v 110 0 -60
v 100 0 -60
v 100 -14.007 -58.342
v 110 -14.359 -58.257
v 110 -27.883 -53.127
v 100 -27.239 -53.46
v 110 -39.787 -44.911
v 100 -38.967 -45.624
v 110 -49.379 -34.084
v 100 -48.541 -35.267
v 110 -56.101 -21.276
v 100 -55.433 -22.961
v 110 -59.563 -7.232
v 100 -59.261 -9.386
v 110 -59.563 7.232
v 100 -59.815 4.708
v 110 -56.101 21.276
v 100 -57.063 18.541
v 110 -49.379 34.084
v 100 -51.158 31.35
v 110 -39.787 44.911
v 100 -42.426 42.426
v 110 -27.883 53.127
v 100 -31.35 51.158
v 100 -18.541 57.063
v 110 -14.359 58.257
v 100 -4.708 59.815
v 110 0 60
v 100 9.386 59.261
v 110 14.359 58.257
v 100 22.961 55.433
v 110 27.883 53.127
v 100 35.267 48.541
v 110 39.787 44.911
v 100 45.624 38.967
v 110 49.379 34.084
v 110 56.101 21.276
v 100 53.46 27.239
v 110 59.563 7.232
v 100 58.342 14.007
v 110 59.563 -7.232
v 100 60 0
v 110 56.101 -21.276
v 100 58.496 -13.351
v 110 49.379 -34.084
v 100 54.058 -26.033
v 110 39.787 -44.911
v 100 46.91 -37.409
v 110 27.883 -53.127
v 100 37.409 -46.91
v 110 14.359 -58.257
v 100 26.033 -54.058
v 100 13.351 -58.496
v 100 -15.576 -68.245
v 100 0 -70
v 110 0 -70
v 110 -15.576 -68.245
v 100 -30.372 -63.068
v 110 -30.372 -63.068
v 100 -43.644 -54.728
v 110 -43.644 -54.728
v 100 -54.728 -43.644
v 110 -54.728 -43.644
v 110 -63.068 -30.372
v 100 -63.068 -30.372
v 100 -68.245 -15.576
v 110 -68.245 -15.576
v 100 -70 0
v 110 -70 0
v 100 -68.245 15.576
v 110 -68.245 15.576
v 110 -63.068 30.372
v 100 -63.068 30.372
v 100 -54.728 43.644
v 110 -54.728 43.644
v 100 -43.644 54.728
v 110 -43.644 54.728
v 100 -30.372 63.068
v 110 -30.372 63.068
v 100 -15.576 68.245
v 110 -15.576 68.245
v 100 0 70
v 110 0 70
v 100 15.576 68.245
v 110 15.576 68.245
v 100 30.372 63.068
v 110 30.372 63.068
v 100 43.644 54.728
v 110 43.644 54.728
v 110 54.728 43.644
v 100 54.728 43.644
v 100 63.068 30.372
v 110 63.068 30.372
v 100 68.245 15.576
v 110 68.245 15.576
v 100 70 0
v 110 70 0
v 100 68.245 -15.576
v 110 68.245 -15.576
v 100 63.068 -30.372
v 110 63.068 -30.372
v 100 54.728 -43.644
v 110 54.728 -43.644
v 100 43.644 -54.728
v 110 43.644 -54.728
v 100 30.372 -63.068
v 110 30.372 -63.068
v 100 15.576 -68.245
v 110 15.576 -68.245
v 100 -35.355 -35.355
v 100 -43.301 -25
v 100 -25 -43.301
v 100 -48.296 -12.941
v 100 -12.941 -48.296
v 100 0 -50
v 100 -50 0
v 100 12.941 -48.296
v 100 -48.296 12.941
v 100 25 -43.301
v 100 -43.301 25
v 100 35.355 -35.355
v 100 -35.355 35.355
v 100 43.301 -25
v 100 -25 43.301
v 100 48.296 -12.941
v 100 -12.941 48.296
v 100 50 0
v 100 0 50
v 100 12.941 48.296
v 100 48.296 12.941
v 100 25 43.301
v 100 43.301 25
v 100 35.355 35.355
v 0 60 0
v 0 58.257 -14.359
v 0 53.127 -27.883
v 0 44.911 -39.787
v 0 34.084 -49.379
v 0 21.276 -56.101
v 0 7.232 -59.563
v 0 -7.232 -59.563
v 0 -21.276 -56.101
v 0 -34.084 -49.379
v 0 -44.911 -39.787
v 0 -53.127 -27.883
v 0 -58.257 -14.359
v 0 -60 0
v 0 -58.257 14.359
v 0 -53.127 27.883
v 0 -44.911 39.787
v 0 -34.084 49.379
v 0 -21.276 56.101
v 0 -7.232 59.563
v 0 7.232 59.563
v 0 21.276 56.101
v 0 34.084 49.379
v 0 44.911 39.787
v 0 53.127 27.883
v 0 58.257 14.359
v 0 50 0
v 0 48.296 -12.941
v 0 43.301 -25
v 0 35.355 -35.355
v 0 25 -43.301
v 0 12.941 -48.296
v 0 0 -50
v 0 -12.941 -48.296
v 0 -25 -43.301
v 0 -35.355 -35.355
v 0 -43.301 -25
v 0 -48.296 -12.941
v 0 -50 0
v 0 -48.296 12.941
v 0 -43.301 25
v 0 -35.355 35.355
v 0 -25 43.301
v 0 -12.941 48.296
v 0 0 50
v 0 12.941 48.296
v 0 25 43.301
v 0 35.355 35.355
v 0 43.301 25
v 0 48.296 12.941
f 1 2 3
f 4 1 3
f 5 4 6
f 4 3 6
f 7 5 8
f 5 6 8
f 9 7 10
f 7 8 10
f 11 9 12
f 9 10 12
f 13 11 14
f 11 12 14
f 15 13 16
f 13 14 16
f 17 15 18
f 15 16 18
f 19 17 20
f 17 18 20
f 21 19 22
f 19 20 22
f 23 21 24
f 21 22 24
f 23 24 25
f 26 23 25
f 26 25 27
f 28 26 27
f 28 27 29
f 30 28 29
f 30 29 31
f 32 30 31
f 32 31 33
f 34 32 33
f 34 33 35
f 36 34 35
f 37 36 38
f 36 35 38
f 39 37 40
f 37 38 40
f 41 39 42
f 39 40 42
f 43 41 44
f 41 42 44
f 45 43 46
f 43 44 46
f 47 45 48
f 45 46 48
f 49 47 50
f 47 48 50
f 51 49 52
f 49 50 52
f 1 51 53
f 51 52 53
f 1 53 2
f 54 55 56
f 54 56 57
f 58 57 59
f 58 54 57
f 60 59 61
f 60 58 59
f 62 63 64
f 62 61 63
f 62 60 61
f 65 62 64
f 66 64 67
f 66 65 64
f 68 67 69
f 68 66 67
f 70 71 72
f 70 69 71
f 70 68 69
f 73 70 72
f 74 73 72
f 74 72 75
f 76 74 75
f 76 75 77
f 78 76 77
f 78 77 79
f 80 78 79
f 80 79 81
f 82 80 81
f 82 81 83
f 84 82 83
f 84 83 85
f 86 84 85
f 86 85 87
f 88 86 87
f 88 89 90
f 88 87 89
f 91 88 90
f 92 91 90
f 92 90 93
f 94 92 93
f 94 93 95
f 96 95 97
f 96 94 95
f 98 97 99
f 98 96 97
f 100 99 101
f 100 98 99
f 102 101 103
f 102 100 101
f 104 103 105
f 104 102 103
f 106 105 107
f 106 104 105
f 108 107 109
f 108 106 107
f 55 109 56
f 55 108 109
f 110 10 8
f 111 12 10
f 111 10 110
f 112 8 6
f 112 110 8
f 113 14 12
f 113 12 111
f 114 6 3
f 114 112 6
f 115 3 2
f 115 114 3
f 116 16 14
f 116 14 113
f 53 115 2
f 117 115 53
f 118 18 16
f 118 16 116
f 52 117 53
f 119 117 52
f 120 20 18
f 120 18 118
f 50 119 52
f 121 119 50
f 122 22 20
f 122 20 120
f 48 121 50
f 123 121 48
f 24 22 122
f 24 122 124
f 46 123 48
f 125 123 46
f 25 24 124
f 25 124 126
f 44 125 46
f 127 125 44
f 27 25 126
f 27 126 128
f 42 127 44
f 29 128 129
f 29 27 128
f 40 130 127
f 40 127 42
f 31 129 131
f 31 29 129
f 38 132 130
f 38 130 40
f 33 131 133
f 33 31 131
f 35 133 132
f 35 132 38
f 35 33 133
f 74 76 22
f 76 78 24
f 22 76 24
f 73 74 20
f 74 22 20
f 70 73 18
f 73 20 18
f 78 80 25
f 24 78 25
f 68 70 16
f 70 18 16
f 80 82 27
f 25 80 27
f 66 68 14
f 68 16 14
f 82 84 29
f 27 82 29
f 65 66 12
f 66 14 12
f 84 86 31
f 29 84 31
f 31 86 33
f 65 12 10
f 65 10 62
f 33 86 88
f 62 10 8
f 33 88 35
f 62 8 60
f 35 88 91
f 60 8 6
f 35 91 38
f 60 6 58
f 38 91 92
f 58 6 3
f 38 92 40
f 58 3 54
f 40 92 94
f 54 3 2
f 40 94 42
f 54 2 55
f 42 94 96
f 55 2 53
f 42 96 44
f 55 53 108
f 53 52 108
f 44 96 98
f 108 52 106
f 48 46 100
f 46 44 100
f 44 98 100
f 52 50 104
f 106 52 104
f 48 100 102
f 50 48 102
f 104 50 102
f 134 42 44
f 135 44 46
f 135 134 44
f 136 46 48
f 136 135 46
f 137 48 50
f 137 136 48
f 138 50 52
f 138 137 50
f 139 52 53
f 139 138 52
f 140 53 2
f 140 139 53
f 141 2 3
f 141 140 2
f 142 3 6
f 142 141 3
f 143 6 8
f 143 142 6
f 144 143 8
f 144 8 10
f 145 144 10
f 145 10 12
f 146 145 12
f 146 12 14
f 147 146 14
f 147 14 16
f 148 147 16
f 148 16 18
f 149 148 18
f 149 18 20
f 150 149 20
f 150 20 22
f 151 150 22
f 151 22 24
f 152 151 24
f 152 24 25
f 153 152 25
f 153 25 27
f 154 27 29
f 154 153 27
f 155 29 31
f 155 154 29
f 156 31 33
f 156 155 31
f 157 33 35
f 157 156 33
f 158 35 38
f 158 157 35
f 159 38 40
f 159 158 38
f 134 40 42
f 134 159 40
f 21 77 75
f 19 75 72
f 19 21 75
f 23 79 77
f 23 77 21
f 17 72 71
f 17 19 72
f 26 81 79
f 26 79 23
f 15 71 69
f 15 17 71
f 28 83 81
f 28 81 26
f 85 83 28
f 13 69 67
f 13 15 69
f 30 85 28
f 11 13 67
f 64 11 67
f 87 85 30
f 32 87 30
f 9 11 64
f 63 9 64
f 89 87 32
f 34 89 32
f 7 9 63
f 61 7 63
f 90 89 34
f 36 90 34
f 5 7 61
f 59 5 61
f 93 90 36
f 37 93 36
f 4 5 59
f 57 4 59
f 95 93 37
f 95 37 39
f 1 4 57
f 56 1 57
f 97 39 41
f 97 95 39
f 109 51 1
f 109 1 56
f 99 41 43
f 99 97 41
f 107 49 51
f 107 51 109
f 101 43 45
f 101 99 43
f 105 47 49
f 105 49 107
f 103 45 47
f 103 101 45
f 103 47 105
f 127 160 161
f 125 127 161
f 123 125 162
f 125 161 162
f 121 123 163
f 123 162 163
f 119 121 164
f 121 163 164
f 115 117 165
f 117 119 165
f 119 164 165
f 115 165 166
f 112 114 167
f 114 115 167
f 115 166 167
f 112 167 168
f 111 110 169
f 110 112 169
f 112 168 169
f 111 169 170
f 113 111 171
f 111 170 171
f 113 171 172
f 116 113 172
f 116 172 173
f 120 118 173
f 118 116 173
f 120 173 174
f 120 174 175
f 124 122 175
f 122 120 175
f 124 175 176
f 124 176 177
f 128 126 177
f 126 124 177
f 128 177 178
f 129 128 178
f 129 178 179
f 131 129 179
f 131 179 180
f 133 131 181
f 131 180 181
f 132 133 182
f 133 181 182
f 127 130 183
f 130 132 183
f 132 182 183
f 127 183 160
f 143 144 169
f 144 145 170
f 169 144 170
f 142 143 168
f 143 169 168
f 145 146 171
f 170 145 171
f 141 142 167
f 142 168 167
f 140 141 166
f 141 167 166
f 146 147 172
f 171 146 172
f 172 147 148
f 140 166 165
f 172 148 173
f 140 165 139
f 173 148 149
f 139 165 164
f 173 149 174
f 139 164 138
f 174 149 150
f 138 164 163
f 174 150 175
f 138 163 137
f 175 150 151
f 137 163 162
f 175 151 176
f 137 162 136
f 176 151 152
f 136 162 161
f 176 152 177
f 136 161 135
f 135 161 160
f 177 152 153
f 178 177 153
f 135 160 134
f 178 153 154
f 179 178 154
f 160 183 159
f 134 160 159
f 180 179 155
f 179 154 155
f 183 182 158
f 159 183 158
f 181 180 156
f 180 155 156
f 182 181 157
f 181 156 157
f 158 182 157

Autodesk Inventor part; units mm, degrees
ref_plane "YZ Plane" through (0, 0, 0) normal (1, 0, 0) x (0, 1, 0)
ref_plane "XZ Plane" through (0, 0, 0) normal (0, 1, 0) x (-1, 0, 0)
ref_plane "XY Plane" through (0, 0, 0) normal (0, 0, 1) x (1, 0, 0)
sketch "Sketch1" plane through (0, 0, 0) normal (1, 0, 0) x (0, 1, 0)
  point P0 (0, 0)
sketch "Sketch2" plane through (0, 0, 0) normal (1, 0, 0) x (0, 1, 0)
  circle A0 centre (0, 0) radius 50
  circle A1 centre (0, 0) radius 60
  dimension "d0" = 100
  dimension "d1" = 120
extrude "Extrusion1" add sketch "Sketch2" along normal blind 100
sketch "Sketch3" plane through (100, 0, 0) normal (1, 0, 0) x (0, 0, -1)
  circle A0 centre (0, 0) radius 60
  circle A1 centre (0, 0) radius 70
  dimension "d4" = 120
  dimension "d5" = 140
extrude "Extrusion2" add sketch "Sketch3" along normal blind 10
properties part number "3_Ong_lot_truc_I"
